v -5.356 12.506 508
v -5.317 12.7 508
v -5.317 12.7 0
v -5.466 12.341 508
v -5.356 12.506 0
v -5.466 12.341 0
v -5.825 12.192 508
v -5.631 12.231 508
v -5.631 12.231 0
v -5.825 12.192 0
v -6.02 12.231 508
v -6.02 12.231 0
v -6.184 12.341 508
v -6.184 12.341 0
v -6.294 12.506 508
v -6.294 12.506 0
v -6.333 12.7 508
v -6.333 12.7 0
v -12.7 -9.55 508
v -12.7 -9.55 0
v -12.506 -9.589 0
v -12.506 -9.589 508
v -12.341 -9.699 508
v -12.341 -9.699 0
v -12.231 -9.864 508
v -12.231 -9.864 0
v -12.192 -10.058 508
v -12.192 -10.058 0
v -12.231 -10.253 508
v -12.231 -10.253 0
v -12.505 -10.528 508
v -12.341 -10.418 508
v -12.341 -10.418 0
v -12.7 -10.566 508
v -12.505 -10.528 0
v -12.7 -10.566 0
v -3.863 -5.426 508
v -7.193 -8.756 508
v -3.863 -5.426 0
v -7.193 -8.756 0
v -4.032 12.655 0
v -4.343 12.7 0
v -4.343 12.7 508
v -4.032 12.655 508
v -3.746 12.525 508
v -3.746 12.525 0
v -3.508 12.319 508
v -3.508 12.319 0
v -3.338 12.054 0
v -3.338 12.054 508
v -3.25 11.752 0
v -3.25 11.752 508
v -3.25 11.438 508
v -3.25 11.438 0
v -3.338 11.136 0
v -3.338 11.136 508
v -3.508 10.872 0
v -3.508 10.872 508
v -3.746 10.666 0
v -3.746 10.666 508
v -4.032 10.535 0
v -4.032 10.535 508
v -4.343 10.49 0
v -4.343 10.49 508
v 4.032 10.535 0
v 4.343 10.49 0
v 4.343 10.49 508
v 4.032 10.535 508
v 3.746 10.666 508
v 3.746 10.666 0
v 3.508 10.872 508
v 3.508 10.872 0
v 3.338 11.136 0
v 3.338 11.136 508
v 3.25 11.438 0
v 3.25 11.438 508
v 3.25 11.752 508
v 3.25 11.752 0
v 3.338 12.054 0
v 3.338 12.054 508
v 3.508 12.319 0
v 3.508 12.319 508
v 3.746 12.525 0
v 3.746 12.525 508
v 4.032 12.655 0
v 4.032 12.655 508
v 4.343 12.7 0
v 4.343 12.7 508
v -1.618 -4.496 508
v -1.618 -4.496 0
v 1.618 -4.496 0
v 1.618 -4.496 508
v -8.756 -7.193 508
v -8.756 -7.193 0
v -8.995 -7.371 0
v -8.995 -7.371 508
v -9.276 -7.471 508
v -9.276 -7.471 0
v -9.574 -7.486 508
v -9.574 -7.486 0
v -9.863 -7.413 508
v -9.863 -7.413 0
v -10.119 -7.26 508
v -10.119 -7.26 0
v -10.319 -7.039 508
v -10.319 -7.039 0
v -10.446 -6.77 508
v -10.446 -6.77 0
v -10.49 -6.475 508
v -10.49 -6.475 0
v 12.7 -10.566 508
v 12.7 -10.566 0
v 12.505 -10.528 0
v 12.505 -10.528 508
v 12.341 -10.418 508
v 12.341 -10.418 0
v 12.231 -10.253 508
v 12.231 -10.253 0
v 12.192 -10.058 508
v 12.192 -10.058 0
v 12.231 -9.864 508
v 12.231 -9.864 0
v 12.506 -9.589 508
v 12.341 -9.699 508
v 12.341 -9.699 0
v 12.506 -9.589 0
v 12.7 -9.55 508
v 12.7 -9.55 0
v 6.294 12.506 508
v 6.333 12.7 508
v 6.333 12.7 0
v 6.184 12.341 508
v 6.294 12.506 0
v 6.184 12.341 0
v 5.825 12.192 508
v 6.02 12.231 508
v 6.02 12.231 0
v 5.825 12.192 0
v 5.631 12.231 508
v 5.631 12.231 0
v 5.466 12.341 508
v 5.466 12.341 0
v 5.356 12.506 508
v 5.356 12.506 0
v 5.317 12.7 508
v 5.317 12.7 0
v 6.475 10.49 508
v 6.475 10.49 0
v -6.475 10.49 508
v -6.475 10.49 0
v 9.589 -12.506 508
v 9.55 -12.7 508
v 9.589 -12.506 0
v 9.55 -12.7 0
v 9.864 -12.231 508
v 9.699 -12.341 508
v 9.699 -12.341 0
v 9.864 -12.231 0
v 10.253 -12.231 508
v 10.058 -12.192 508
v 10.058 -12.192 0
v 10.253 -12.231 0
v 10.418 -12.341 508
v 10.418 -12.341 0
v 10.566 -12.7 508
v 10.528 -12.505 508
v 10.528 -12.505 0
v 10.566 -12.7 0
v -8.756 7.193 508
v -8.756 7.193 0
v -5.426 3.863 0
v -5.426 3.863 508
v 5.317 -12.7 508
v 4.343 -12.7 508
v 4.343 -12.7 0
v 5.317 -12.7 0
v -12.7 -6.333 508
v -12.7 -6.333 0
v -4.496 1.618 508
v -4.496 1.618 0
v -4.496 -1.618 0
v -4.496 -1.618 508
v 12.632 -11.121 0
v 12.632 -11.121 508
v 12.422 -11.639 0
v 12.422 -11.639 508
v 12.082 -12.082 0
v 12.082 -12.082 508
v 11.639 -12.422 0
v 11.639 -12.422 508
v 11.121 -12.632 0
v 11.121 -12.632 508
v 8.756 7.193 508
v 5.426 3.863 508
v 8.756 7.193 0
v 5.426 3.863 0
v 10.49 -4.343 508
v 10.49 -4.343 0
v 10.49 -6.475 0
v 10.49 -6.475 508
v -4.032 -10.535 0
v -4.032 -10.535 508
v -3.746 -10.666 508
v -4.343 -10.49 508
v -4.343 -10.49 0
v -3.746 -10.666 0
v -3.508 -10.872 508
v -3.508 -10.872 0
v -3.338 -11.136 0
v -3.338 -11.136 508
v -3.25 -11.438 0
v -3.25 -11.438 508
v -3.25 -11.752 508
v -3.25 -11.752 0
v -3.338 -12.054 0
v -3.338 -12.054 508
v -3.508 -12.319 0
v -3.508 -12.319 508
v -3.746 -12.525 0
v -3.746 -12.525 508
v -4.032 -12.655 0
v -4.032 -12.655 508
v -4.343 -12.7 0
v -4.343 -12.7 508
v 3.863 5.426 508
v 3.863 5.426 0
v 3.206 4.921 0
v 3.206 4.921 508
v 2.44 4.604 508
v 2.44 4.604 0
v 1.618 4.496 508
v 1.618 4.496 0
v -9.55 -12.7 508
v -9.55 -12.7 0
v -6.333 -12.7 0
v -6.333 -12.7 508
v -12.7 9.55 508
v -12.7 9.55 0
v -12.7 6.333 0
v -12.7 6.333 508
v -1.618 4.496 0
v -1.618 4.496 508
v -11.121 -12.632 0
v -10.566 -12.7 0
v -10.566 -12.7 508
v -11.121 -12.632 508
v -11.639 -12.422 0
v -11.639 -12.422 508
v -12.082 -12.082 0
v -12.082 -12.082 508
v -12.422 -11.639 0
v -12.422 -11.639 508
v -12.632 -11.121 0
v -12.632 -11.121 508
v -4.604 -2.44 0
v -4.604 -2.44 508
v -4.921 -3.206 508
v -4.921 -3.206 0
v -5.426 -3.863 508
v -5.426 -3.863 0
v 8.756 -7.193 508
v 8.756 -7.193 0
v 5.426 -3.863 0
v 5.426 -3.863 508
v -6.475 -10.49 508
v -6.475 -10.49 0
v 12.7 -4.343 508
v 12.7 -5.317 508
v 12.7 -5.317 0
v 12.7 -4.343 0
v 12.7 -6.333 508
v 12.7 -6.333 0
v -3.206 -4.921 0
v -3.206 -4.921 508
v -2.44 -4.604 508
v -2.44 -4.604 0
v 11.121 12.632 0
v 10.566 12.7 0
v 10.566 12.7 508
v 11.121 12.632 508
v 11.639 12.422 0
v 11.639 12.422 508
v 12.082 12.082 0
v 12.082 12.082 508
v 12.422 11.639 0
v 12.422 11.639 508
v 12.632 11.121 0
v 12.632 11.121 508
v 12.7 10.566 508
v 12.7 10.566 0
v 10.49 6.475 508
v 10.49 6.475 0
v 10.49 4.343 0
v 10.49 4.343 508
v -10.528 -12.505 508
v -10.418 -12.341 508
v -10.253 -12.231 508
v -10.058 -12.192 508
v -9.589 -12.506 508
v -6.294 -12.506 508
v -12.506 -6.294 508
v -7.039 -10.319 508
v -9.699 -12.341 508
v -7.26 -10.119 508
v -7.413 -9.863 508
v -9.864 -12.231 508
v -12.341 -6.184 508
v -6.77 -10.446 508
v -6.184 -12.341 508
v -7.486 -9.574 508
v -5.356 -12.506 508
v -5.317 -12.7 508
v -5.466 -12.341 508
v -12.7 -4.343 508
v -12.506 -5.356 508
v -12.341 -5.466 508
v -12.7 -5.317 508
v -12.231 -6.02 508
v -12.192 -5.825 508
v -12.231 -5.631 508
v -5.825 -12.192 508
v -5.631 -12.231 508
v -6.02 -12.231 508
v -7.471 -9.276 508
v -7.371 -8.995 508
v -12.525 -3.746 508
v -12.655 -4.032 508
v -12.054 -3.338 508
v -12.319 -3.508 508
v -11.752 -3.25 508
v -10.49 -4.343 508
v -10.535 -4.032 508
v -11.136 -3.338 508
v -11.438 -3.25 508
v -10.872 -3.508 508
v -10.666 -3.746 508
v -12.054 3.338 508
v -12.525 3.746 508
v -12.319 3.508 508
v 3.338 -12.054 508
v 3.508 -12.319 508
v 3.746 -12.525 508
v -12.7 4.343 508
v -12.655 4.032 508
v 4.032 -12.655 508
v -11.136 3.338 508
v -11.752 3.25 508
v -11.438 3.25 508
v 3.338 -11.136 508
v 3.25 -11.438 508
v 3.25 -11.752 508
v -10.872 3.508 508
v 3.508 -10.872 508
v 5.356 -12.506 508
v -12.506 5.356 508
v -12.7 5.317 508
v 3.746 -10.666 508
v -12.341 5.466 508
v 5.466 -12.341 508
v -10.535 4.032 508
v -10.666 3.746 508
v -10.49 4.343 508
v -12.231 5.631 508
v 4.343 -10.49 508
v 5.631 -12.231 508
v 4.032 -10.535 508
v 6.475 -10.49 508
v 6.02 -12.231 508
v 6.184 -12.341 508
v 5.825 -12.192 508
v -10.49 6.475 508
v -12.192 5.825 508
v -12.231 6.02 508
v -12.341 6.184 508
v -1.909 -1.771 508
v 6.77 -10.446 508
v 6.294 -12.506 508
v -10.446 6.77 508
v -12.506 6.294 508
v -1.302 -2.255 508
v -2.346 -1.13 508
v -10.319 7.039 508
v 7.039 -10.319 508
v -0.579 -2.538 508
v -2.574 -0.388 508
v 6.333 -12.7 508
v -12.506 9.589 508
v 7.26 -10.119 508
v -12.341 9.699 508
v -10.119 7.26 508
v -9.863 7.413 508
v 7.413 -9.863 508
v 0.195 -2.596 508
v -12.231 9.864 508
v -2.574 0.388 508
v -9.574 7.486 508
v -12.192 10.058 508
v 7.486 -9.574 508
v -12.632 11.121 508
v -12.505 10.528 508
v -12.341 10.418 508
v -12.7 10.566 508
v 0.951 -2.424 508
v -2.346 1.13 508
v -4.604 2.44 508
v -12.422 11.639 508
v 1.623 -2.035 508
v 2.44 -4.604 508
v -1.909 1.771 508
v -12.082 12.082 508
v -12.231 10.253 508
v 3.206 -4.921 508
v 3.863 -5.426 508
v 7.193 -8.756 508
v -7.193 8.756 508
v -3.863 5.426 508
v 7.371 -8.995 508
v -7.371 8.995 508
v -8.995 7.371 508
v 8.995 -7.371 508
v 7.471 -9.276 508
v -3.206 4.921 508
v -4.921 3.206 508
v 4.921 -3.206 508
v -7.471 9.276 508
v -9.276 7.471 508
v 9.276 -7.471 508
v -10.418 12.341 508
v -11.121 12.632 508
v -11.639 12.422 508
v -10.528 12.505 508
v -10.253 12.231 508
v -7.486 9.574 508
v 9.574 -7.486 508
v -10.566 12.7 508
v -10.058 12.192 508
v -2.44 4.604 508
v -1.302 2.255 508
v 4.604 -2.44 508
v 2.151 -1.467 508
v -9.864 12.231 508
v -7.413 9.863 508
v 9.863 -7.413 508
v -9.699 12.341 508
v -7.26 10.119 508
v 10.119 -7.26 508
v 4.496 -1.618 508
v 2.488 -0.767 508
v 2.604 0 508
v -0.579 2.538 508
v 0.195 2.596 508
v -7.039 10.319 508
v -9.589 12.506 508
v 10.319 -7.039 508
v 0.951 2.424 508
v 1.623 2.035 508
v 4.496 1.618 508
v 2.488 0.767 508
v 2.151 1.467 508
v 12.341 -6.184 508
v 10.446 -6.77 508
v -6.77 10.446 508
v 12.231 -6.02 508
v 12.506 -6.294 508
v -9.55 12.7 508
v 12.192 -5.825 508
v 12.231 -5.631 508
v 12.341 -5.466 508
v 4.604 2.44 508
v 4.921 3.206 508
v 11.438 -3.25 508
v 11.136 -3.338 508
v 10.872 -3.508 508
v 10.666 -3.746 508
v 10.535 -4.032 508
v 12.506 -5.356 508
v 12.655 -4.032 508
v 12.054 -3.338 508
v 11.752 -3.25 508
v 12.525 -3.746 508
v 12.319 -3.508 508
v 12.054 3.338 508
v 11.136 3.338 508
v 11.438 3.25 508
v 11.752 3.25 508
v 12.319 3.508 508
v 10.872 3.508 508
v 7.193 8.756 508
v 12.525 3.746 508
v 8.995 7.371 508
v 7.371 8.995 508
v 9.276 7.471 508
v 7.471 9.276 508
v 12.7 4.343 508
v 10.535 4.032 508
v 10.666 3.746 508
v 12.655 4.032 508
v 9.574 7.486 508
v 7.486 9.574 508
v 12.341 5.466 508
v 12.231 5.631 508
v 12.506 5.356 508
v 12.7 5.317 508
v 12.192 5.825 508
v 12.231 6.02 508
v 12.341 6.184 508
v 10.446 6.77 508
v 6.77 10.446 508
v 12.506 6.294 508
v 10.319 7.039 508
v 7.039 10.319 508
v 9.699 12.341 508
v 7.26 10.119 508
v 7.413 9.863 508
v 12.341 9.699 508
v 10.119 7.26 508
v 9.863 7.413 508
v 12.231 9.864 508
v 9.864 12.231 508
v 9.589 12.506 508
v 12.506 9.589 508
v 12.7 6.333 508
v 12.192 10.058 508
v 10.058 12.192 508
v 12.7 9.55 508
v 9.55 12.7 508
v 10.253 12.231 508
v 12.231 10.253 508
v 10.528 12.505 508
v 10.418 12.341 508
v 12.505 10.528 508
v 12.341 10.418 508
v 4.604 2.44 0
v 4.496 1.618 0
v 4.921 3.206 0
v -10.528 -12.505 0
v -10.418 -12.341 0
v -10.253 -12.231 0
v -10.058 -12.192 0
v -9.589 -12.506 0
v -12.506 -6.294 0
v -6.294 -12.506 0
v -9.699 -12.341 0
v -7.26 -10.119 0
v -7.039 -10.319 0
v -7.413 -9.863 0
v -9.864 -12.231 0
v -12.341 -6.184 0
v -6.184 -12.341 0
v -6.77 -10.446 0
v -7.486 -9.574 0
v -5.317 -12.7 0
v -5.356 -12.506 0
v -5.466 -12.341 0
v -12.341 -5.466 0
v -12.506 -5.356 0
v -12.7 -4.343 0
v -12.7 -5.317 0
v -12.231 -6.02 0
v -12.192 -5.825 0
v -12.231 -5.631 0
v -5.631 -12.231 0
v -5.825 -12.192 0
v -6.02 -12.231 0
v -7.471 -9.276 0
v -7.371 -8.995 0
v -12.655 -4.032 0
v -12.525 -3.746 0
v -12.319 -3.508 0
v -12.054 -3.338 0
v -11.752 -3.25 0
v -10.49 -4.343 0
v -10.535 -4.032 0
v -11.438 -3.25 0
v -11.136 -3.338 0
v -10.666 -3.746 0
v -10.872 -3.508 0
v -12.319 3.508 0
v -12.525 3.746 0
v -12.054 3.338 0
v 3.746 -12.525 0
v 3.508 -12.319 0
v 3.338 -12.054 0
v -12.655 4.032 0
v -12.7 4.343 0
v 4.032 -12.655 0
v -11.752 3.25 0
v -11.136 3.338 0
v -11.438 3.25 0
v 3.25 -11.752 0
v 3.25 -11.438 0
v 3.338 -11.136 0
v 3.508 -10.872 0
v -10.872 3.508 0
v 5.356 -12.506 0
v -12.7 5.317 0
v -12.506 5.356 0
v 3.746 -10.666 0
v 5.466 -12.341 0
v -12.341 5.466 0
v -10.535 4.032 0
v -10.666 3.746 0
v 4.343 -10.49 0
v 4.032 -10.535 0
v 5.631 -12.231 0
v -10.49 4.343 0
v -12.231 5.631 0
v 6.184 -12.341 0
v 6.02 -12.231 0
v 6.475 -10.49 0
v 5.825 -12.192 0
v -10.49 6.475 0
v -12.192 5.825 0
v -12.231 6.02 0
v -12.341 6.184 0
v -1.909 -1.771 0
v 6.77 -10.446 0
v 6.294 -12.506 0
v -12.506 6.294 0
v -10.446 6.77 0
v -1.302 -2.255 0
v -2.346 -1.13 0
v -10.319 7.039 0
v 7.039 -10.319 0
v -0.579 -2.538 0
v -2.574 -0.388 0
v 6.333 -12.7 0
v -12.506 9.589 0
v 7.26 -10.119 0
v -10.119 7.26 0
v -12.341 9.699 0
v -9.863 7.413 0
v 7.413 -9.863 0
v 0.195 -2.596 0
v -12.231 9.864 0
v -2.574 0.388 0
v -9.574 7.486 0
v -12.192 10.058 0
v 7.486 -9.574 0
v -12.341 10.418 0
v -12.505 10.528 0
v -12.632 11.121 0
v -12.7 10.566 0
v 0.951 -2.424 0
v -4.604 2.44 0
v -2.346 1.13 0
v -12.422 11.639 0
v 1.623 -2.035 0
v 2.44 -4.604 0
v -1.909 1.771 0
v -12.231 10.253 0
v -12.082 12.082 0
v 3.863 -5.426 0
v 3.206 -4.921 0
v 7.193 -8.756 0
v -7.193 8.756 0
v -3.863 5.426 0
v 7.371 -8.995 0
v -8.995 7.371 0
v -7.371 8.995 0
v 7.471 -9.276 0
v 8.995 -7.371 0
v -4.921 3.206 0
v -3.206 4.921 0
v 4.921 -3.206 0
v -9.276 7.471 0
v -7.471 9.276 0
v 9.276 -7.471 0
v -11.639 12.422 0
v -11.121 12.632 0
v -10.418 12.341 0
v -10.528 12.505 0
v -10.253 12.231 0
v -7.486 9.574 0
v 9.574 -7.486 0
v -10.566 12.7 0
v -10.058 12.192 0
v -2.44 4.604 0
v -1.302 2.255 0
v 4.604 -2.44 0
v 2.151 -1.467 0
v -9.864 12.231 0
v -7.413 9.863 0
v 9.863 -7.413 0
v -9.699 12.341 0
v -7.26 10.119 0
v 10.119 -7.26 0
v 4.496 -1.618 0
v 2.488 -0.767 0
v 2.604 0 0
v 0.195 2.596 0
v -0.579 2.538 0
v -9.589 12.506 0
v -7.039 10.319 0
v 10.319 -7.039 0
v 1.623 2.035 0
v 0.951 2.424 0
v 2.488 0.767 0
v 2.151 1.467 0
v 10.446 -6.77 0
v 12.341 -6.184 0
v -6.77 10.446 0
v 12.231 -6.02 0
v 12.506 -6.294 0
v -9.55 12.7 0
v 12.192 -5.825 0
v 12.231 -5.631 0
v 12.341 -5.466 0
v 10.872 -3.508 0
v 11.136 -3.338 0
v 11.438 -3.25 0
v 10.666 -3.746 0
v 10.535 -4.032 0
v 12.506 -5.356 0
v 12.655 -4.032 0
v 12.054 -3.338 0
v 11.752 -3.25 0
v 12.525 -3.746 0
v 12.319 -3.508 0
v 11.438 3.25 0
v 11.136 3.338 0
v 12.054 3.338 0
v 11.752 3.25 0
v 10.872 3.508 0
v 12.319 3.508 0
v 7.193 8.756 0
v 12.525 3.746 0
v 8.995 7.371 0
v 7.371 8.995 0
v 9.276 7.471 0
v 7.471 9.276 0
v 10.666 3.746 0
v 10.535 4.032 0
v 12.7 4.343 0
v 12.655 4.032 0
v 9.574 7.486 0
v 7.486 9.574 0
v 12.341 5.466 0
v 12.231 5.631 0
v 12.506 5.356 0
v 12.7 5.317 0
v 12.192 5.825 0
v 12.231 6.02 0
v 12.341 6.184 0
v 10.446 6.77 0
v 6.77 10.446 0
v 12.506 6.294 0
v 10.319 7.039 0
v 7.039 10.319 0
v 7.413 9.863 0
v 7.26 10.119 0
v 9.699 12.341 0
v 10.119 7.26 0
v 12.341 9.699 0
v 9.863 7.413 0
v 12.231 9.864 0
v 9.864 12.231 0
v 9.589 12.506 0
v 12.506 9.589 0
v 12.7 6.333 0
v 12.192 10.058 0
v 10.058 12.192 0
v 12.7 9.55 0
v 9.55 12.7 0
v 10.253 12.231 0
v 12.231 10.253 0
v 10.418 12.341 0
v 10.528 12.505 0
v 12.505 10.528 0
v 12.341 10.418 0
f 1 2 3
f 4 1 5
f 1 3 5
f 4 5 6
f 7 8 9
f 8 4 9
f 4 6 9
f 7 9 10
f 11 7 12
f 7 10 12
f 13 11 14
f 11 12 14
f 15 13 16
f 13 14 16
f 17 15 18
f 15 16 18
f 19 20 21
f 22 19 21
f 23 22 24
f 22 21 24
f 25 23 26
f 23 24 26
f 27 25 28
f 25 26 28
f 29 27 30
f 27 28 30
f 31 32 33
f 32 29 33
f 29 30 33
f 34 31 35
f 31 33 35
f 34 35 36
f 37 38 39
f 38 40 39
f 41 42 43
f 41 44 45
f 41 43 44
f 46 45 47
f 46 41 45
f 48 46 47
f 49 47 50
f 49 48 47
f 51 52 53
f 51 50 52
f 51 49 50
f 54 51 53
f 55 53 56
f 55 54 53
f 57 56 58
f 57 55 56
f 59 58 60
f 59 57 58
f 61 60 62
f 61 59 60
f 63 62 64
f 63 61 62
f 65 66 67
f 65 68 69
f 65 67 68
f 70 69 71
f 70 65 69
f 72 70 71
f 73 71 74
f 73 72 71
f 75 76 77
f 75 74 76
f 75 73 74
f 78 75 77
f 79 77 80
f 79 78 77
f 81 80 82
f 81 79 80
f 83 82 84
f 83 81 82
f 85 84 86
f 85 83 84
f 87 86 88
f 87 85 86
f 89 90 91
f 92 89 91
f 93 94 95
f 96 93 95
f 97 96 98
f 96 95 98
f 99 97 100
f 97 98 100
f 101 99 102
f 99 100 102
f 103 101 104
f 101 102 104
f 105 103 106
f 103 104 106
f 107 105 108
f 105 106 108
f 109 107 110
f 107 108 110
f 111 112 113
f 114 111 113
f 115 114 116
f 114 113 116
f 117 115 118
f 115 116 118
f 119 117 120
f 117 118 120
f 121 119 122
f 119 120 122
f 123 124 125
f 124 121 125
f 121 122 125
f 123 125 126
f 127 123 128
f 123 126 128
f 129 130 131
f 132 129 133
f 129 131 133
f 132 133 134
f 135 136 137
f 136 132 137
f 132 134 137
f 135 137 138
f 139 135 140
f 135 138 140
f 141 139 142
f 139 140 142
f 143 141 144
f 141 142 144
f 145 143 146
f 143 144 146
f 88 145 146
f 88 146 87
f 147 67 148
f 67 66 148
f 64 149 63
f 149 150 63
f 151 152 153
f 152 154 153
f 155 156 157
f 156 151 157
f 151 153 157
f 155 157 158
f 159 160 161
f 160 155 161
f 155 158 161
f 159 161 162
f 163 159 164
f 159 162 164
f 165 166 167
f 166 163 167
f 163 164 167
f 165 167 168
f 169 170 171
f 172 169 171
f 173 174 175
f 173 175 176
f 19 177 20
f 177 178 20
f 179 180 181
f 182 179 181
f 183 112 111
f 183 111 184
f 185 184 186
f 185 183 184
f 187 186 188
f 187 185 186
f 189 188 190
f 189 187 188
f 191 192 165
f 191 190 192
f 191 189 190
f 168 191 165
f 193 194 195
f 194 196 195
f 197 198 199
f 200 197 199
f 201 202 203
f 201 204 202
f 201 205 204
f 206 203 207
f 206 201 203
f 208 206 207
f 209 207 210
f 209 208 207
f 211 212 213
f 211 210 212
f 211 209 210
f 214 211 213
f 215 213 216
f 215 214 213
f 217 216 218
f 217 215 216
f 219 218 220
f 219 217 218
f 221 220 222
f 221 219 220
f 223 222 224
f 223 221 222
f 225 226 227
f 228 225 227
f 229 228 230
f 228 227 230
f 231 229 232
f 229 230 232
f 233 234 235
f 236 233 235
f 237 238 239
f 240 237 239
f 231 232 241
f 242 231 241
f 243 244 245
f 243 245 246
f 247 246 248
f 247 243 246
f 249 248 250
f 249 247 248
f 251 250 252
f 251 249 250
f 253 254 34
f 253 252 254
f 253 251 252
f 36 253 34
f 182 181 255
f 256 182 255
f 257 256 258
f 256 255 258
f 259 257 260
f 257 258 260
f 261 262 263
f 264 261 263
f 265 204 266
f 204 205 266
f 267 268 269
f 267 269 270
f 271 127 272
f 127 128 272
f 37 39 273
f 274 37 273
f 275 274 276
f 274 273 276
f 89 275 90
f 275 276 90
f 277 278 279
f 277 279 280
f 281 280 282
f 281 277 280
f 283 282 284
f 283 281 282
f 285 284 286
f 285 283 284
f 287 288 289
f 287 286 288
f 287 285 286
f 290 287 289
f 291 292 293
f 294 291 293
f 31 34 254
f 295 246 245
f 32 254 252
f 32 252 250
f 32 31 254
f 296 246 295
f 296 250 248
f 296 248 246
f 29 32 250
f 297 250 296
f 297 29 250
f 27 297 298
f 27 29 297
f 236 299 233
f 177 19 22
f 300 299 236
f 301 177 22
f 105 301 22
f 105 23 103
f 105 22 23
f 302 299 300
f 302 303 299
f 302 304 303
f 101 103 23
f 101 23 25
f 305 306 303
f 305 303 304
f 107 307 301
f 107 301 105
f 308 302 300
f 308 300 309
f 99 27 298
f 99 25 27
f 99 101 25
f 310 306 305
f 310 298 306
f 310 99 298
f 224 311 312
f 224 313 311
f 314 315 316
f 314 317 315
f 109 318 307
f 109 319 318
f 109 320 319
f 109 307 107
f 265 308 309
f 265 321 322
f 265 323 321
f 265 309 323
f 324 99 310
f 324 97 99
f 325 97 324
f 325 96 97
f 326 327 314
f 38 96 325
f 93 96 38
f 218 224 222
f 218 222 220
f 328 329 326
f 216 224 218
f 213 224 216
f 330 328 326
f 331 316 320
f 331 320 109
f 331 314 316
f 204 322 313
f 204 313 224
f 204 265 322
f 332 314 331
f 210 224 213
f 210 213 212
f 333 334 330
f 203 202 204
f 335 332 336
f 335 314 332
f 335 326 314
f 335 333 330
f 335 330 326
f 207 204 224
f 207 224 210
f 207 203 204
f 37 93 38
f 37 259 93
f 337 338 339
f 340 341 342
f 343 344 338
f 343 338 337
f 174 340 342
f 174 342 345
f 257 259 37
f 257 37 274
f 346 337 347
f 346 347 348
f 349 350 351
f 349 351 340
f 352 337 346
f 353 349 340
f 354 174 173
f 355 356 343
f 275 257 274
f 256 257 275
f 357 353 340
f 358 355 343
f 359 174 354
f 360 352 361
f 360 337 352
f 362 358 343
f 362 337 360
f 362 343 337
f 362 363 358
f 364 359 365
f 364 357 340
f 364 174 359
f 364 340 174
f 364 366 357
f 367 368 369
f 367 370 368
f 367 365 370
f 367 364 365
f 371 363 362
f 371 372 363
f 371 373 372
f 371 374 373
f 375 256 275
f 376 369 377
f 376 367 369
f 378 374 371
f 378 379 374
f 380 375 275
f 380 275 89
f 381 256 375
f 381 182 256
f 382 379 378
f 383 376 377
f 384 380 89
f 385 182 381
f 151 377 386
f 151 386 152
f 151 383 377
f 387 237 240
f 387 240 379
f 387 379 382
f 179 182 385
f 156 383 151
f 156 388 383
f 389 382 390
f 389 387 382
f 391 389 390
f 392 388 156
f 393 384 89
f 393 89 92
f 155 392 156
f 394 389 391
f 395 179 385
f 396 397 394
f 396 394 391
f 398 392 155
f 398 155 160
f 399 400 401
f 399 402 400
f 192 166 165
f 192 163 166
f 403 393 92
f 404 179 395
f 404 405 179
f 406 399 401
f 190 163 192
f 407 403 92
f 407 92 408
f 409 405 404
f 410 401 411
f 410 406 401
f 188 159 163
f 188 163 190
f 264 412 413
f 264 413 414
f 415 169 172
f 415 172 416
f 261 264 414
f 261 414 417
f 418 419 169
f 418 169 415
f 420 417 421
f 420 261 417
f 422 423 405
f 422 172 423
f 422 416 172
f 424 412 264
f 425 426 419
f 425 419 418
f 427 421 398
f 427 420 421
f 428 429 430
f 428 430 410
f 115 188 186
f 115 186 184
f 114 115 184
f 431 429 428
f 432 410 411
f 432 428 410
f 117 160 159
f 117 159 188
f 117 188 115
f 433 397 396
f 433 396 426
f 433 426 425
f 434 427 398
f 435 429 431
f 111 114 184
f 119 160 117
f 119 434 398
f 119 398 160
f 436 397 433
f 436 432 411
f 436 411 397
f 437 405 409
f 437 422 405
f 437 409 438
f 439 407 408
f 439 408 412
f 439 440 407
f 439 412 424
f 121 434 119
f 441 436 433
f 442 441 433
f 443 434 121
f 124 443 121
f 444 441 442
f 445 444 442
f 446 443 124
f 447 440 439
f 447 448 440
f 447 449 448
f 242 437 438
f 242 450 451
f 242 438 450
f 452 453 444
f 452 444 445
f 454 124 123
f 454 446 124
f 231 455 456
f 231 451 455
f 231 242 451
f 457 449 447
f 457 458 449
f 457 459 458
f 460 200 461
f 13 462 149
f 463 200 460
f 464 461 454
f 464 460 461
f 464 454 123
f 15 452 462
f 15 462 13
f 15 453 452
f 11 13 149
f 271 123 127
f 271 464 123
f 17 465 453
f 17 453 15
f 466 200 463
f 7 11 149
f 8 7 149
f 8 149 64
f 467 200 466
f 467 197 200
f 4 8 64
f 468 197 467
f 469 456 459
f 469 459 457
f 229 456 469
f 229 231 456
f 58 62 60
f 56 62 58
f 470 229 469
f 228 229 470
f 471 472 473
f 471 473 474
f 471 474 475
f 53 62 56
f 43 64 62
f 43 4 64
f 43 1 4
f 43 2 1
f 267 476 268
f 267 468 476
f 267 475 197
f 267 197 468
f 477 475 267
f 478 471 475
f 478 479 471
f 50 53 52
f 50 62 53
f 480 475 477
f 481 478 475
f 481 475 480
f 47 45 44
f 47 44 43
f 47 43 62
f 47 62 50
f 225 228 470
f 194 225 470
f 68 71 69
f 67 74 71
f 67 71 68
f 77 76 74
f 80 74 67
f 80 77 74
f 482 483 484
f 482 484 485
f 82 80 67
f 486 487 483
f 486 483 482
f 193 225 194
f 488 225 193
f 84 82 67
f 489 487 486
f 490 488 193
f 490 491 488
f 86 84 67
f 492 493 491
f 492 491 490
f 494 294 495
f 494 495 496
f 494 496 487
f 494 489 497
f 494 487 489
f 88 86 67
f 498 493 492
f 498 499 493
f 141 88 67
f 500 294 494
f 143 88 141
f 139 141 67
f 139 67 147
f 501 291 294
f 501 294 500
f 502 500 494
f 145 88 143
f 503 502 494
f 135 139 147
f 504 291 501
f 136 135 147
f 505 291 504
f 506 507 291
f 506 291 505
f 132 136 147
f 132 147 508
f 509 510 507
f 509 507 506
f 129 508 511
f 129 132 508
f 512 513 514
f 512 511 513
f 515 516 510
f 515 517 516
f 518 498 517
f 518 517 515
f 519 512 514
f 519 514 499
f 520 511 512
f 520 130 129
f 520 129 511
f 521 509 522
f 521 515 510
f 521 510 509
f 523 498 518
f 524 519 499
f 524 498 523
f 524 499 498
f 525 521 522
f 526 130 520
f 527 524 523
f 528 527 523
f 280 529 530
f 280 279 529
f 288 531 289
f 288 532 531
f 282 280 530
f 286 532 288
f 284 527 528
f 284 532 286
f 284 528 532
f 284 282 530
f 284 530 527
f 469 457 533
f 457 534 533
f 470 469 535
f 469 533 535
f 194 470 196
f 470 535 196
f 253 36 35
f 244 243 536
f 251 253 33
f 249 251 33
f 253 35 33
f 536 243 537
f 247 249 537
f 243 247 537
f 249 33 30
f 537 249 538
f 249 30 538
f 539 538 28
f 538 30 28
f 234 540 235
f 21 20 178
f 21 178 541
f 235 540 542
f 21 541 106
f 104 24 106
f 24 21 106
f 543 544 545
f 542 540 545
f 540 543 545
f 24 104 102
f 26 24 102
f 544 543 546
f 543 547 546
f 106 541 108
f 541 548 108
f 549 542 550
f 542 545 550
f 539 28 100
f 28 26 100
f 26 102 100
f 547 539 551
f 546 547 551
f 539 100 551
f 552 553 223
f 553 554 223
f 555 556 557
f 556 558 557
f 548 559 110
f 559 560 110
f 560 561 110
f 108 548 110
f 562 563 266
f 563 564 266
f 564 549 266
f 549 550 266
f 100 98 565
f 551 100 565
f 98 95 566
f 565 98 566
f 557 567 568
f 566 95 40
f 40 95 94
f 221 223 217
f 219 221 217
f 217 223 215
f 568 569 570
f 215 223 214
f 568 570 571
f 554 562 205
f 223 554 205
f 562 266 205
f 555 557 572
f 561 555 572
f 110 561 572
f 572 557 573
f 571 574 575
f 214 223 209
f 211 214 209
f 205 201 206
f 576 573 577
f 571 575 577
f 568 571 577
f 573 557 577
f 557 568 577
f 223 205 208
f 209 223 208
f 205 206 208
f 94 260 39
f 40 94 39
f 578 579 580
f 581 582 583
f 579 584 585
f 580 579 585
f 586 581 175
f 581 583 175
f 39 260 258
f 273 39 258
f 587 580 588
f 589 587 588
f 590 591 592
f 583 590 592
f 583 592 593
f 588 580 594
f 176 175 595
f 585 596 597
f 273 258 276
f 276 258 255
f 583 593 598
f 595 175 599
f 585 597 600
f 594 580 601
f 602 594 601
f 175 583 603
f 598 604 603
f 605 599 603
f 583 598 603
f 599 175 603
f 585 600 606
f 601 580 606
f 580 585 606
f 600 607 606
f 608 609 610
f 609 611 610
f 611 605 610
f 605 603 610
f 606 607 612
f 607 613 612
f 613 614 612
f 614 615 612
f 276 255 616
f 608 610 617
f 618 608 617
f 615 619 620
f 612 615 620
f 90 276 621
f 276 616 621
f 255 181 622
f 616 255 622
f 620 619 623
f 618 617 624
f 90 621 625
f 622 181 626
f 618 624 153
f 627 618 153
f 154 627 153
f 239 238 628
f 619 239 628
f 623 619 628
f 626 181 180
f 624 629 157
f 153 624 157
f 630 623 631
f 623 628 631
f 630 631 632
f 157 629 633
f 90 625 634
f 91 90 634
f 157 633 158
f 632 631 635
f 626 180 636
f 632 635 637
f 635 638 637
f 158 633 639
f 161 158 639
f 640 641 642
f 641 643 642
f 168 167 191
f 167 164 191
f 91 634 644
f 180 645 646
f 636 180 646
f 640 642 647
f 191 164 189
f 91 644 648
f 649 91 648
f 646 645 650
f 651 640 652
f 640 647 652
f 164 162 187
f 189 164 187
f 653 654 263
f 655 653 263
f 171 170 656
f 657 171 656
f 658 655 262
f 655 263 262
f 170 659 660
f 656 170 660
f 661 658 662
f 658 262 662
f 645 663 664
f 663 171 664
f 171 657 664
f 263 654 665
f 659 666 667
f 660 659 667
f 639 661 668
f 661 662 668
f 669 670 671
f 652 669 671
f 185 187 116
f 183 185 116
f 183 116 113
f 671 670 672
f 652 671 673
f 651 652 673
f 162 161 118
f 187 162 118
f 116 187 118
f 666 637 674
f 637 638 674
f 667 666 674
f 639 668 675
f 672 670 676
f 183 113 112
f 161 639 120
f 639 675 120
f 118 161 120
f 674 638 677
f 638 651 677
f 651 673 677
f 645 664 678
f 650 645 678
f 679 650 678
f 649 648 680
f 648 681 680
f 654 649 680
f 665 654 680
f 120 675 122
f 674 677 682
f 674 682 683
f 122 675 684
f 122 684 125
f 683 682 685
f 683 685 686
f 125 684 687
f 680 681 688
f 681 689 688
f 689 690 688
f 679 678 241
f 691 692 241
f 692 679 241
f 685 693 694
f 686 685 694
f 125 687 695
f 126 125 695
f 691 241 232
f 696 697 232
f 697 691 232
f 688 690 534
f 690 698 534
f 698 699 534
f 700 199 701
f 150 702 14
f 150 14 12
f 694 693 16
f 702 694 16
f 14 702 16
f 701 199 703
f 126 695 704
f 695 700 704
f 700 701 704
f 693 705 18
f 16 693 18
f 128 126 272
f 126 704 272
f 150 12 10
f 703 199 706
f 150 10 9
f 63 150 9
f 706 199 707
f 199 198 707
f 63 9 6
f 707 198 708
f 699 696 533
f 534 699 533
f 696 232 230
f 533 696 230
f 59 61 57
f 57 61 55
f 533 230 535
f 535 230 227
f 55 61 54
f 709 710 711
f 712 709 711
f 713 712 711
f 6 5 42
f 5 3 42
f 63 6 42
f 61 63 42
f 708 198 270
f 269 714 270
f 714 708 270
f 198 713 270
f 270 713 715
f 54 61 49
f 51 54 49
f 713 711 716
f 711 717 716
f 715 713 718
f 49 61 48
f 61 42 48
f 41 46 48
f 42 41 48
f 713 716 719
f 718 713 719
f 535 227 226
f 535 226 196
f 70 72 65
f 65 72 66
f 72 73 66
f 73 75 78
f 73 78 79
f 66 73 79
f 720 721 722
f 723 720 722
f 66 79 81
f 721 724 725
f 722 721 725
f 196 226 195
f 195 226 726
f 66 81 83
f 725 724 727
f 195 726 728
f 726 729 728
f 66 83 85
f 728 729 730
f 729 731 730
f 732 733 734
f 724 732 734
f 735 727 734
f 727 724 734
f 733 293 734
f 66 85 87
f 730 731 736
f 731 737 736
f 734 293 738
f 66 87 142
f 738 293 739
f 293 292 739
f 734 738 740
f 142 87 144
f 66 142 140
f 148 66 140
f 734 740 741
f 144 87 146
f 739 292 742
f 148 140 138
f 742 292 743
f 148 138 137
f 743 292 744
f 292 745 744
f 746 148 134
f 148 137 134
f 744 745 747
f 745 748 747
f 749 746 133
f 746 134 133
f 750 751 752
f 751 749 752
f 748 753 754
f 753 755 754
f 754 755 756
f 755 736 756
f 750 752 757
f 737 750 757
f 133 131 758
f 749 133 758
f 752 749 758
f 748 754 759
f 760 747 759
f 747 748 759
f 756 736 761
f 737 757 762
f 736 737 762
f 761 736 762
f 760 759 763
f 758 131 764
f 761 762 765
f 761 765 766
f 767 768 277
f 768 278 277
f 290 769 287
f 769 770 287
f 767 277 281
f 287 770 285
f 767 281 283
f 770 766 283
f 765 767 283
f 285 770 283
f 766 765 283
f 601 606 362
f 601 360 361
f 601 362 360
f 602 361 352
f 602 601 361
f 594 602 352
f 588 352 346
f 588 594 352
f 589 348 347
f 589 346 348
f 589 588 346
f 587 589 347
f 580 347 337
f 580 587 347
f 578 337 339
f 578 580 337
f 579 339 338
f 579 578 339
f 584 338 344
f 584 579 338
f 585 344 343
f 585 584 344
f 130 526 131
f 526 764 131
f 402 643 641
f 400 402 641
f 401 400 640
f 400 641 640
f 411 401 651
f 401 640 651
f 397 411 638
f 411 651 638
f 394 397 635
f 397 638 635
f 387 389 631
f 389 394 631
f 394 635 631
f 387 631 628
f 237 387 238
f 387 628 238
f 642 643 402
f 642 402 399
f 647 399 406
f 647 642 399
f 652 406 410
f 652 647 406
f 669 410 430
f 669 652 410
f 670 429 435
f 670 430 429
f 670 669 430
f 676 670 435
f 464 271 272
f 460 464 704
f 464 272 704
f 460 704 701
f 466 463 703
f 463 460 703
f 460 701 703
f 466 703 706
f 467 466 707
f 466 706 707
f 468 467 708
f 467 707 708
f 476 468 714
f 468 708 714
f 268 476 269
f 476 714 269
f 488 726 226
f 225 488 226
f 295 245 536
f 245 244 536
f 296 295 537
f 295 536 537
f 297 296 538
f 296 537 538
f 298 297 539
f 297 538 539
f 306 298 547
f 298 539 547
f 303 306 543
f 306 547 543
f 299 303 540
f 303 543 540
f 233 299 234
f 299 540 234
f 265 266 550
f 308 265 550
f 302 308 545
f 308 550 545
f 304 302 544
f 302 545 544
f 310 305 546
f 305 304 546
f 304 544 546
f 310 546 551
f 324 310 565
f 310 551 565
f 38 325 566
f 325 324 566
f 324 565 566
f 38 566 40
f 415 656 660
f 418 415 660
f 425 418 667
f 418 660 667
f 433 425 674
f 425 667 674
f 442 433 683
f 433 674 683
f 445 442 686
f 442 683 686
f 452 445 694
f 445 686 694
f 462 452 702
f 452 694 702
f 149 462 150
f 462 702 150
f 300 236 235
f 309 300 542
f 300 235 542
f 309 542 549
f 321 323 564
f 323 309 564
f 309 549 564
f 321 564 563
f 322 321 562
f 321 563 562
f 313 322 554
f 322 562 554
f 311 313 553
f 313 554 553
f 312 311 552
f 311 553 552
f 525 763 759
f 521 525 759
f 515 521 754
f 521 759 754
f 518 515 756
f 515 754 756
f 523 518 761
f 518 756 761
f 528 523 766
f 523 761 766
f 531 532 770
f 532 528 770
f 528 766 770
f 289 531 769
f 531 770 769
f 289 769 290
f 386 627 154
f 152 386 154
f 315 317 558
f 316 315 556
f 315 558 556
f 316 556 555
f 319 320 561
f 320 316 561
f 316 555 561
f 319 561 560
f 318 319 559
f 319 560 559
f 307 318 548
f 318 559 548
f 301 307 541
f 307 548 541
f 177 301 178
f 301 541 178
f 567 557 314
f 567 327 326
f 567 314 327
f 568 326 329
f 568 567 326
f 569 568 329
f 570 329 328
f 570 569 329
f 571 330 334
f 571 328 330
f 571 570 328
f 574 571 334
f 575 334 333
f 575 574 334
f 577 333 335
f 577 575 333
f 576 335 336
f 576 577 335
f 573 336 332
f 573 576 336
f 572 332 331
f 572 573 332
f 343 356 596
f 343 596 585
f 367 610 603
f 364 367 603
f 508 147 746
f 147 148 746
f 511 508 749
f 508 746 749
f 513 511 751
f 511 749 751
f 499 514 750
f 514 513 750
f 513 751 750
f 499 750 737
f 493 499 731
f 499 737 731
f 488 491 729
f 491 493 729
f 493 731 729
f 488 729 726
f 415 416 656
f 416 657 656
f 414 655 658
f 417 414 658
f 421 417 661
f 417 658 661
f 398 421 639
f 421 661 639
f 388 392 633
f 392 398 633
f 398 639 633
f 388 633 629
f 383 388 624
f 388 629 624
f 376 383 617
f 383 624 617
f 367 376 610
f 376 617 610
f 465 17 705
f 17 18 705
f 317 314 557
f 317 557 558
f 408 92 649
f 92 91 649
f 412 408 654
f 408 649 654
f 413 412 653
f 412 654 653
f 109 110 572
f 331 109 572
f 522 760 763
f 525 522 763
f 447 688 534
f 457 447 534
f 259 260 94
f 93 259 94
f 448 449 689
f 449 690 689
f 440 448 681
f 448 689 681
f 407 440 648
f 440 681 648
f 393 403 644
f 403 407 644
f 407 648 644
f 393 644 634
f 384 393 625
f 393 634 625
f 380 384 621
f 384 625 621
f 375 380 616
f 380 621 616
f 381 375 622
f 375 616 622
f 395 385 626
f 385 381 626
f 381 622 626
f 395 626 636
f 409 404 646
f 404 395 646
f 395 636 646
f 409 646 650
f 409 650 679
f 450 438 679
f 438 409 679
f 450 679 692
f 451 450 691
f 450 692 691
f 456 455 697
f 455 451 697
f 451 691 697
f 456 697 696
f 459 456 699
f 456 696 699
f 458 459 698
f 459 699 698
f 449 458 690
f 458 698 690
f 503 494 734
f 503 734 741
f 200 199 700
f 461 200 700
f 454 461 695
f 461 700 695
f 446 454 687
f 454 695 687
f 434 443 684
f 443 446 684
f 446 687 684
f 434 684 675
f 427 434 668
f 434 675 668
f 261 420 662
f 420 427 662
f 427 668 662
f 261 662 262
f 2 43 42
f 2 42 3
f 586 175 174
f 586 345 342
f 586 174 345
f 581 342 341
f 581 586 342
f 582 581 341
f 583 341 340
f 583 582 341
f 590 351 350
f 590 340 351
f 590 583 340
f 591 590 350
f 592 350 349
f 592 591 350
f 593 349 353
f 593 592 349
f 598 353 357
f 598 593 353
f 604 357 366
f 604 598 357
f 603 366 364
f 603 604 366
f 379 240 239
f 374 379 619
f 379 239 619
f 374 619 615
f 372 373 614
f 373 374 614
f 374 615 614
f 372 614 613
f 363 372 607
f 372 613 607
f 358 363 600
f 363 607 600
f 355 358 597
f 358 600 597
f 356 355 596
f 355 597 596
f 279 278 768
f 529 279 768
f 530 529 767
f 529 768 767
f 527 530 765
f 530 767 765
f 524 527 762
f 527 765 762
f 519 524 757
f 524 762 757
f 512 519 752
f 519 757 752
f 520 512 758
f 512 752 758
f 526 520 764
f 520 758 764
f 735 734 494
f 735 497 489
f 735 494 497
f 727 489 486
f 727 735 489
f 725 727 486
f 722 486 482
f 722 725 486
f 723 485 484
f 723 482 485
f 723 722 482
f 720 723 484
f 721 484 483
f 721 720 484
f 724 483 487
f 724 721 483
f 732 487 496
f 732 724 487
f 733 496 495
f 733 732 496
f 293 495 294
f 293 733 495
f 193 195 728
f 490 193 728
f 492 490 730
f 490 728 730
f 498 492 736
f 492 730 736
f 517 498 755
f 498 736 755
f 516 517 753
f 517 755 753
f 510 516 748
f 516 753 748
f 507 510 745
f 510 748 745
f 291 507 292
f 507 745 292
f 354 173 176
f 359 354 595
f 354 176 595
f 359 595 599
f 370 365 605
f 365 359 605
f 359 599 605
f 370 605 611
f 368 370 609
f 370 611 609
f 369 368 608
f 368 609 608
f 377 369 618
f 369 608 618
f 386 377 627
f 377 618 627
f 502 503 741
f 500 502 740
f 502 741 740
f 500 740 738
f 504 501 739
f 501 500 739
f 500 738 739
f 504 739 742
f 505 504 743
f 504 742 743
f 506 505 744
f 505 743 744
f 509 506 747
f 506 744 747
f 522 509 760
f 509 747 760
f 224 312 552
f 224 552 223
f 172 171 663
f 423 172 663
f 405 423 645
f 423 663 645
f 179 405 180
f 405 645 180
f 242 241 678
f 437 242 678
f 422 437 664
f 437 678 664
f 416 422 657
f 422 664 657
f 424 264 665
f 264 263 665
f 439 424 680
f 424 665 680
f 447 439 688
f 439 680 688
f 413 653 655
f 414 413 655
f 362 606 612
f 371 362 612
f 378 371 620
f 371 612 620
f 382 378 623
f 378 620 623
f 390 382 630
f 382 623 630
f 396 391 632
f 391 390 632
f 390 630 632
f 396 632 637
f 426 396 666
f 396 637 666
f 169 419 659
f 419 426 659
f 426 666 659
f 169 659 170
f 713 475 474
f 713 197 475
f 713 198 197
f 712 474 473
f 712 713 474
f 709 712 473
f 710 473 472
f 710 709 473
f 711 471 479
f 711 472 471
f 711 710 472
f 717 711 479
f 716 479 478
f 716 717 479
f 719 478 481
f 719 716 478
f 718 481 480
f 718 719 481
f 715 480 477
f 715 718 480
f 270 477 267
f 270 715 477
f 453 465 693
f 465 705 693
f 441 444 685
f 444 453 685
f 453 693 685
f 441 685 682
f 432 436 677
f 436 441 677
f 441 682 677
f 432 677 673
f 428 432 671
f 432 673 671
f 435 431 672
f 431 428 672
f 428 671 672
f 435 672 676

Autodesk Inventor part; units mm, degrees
ref_plane "YZ Plane" through (0, 0, 0) normal (1, 0, 0) x (0, 1, 0)
ref_plane "XZ Plane" through (0, 0, 0) normal (0, 1, 0) x (-1, 0, 0)
ref_plane "XY Plane" through (0, 0, 0) normal (0, 0, 1) x (1, 0, 0)
sketch "Sketch1" plane through (0, 0, 0) normal (0, 0, 1) x (1, 0, 0)
  arc A0 (-12.6998, -10.5664) -> (-10.5664, -12.6998) centre (-10.5918, -10.5918) ccw
  arc A1 (-9.5504, -12.7) -> (-10.5664, -12.6998) centre (-10.0584, -12.7) ccw
  line L0 (-9.5504, -12.7) -> (-6.3331, -12.7)
  arc A2 (-5.3171, -12.7) -> (-6.3331, -12.7) centre (-5.8251, -12.7) ccw
  line L1 (-5.3171, -12.7) -> (-4.3434, -12.7)
  arc A3 (-4.3434, -12.7) -> (-4.3434, -10.4902) centre (-4.3434, -11.5951) ccw
  line L2 (-4.3434, -10.4902) -> (-6.4748, -10.4902)
  arc A4 (-7.1932, -8.7558) -> (-6.4748, -10.4902) centre (-6.4748, -9.4742) ccw
  line L3 (-7.1932, -8.7558) -> (-3.8632, -5.4257)
  arc A5 (-1.6181, -4.4958) -> (-3.8632, -5.4257) centre (-1.6181, -7.6708) ccw
  line L4 (-1.6181, -4.4958) -> (1.6181, -4.4958)
  arc A6 (3.8632, -5.4257) -> (1.6181, -4.4958) centre (1.6181, -7.6708) ccw
  line L5 (3.8632, -5.4257) -> (7.1932, -8.7558)
  arc A7 (6.4748, -10.4902) -> (7.1932, -8.7558) centre (6.4748, -9.4742) ccw
  line L6 (6.4748, -10.4902) -> (4.3434, -10.4902)
  arc A8 (4.3434, -10.4902) -> (4.3434, -12.7) centre (4.3434, -11.5951) ccw
  line L7 (4.3434, -12.7) -> (5.3171, -12.7)
  arc A9 (6.3331, -12.7) -> (5.3171, -12.7) centre (5.8251, -12.7) ccw
  line L8 (6.3331, -12.7) -> (9.5504, -12.7)
  arc A10 (10.5664, -12.6998) -> (9.5504, -12.7) centre (10.0584, -12.7) ccw
  arc A11 (10.5664, -12.6998) -> (12.6998, -10.5664) centre (10.5918, -10.5918) ccw
  arc A12 (12.7, -9.5504) -> (12.6998, -10.5664) centre (12.7, -10.0584) ccw
  line L9 (12.7, -9.5504) -> (12.7, -6.3331)
  arc A13 (12.7, -5.3171) -> (12.7, -6.3331) centre (12.7, -5.8251) ccw
  line L10 (12.7, -5.3171) -> (12.7, -4.3434)
  arc A14 (12.7, -4.3434) -> (10.4902, -4.3434) centre (11.5951, -4.3434) ccw
  line L11 (10.4902, -4.3434) -> (10.4902, -6.4748)
  arc A15 (8.7558, -7.1932) -> (10.4902, -6.4748) centre (9.4742, -6.4748) ccw
  line L12 (8.7558, -7.1932) -> (5.4257, -3.8632)
  arc A16 (4.4958, -1.6181) -> (5.4257, -3.8632) centre (7.6708, -1.6181) ccw
  line L13 (4.4958, -1.6181) -> (4.4958, 1.6181)
  arc A17 (5.4257, 3.8632) -> (4.4958, 1.6181) centre (7.6708, 1.6181) ccw
  line L14 (5.4257, 3.8632) -> (8.7558, 7.1932)
  arc A18 (10.4902, 6.4748) -> (8.7558, 7.1932) centre (9.4742, 6.4748) ccw
  line L15 (10.4902, 6.4748) -> (10.4902, 4.3434)
  arc A19 (10.4902, 4.3434) -> (12.7, 4.3434) centre (11.5951, 4.3434) ccw
  line L16 (12.7, 4.3434) -> (12.7, 5.3171)
  arc A20 (12.7, 6.3331) -> (12.7, 5.3171) centre (12.7, 5.8251) ccw
  line L17 (12.7, 6.3331) -> (12.7, 9.5504)
  arc A21 (12.6998, 10.5664) -> (12.7, 9.5504) centre (12.7, 10.0584) ccw
  arc A22 (12.6998, 10.5664) -> (10.5664, 12.6998) centre (10.5918, 10.5918) ccw
  arc A23 (9.5504, 12.7) -> (10.5664, 12.6998) centre (10.0584, 12.7) ccw
  line L18 (9.5504, 12.7) -> (6.3331, 12.7)
  arc A24 (5.3171, 12.7) -> (6.3331, 12.7) centre (5.8251, 12.7) ccw
  line L19 (5.3171, 12.7) -> (4.3434, 12.7)
  arc A25 (4.3434, 12.7) -> (4.3434, 10.4902) centre (4.3434, 11.5951) ccw
  line L20 (4.3434, 10.4902) -> (6.4748, 10.4902)
  arc A26 (7.1932, 8.7558) -> (6.4748, 10.4902) centre (6.4748, 9.4742) ccw
  line L21 (7.1932, 8.7558) -> (3.8632, 5.4257)
  arc A27 (1.6181, 4.4958) -> (3.8632, 5.4257) centre (1.6181, 7.6708) ccw
  line L22 (1.6181, 4.4958) -> (-1.6181, 4.4958)
  arc A28 (-3.8632, 5.4257) -> (-1.6181, 4.4958) centre (-1.6181, 7.6708) ccw
  line L23 (-3.8632, 5.4257) -> (-7.1932, 8.7558)
  arc A29 (-6.4748, 10.4902) -> (-7.1932, 8.7558) centre (-6.4748, 9.4742) ccw
  line L24 (-6.4748, 10.4902) -> (-4.3434, 10.4902)
  arc A30 (-4.3434, 10.4902) -> (-4.3434, 12.7) centre (-4.3434, 11.5951) ccw
  line L25 (-4.3434, 12.7) -> (-5.3171, 12.7)
  arc A31 (-6.3331, 12.7) -> (-5.3171, 12.7) centre (-5.8251, 12.7) ccw
  line L26 (-6.3331, 12.7) -> (-9.5504, 12.7)
  arc A32 (-10.5664, 12.6998) -> (-9.5504, 12.7) centre (-10.0584, 12.7) ccw
  arc A33 (-10.5664, 12.6998) -> (-12.6998, 10.5664) centre (-10.5918, 10.5918) ccw
  arc A34 (-12.7, 9.5504) -> (-12.6998, 10.5664) centre (-12.7, 10.0584) ccw
  line L27 (-12.7, 9.5504) -> (-12.7, 6.3331)
  arc A35 (-12.7, 5.3171) -> (-12.7, 6.3331) centre (-12.7, 5.8251) ccw
  line L28 (-12.7, 5.3171) -> (-12.7, 4.3434)
  arc A36 (-12.7, 4.3434) -> (-10.4902, 4.3434) centre (-11.5951, 4.3434) ccw
  line L29 (-10.4902, 4.3434) -> (-10.4902, 6.4748)
  arc A37 (-8.7558, 7.1932) -> (-10.4902, 6.4748) centre (-9.4742, 6.4748) ccw
  line L30 (-8.7558, 7.1932) -> (-5.4257, 3.8632)
  arc A38 (-4.4958, 1.6181) -> (-5.4257, 3.8632) centre (-7.6708, 1.6181) ccw
  line L31 (-4.4958, 1.6181) -> (-4.4958, -1.6181)
  arc A39 (-5.4257, -3.8632) -> (-4.4958, -1.6181) centre (-7.6708, -1.6181) ccw
  line L32 (-5.4257, -3.8632) -> (-8.7558, -7.1932)
  arc A40 (-10.4902, -6.4748) -> (-8.7558, -7.1932) centre (-9.4742, -6.4748) ccw
  line L33 (-10.4902, -6.4748) -> (-10.4902, -4.3434)
  arc A41 (-10.4902, -4.3434) -> (-12.7, -4.3434) centre (-11.5951, -4.3434) ccw
  line L34 (-12.7, -4.3434) -> (-12.7, -5.3171)
  arc A42 (-12.7, -6.3331) -> (-12.7, -5.3171) centre (-12.7, -5.8251) ccw
  line L35 (-12.7, -6.3331) -> (-12.7, -9.5504)
  arc A43 (-12.6998, -10.5664) -> (-12.7, -9.5504) centre (-12.7, -10.0584) ccw
  circle A44 centre (0, 0) radius 2.6035
extrude "Extrusion1" add sketch "Sketch1" along normal blind 508
properties part number "1010-20''-CL"
